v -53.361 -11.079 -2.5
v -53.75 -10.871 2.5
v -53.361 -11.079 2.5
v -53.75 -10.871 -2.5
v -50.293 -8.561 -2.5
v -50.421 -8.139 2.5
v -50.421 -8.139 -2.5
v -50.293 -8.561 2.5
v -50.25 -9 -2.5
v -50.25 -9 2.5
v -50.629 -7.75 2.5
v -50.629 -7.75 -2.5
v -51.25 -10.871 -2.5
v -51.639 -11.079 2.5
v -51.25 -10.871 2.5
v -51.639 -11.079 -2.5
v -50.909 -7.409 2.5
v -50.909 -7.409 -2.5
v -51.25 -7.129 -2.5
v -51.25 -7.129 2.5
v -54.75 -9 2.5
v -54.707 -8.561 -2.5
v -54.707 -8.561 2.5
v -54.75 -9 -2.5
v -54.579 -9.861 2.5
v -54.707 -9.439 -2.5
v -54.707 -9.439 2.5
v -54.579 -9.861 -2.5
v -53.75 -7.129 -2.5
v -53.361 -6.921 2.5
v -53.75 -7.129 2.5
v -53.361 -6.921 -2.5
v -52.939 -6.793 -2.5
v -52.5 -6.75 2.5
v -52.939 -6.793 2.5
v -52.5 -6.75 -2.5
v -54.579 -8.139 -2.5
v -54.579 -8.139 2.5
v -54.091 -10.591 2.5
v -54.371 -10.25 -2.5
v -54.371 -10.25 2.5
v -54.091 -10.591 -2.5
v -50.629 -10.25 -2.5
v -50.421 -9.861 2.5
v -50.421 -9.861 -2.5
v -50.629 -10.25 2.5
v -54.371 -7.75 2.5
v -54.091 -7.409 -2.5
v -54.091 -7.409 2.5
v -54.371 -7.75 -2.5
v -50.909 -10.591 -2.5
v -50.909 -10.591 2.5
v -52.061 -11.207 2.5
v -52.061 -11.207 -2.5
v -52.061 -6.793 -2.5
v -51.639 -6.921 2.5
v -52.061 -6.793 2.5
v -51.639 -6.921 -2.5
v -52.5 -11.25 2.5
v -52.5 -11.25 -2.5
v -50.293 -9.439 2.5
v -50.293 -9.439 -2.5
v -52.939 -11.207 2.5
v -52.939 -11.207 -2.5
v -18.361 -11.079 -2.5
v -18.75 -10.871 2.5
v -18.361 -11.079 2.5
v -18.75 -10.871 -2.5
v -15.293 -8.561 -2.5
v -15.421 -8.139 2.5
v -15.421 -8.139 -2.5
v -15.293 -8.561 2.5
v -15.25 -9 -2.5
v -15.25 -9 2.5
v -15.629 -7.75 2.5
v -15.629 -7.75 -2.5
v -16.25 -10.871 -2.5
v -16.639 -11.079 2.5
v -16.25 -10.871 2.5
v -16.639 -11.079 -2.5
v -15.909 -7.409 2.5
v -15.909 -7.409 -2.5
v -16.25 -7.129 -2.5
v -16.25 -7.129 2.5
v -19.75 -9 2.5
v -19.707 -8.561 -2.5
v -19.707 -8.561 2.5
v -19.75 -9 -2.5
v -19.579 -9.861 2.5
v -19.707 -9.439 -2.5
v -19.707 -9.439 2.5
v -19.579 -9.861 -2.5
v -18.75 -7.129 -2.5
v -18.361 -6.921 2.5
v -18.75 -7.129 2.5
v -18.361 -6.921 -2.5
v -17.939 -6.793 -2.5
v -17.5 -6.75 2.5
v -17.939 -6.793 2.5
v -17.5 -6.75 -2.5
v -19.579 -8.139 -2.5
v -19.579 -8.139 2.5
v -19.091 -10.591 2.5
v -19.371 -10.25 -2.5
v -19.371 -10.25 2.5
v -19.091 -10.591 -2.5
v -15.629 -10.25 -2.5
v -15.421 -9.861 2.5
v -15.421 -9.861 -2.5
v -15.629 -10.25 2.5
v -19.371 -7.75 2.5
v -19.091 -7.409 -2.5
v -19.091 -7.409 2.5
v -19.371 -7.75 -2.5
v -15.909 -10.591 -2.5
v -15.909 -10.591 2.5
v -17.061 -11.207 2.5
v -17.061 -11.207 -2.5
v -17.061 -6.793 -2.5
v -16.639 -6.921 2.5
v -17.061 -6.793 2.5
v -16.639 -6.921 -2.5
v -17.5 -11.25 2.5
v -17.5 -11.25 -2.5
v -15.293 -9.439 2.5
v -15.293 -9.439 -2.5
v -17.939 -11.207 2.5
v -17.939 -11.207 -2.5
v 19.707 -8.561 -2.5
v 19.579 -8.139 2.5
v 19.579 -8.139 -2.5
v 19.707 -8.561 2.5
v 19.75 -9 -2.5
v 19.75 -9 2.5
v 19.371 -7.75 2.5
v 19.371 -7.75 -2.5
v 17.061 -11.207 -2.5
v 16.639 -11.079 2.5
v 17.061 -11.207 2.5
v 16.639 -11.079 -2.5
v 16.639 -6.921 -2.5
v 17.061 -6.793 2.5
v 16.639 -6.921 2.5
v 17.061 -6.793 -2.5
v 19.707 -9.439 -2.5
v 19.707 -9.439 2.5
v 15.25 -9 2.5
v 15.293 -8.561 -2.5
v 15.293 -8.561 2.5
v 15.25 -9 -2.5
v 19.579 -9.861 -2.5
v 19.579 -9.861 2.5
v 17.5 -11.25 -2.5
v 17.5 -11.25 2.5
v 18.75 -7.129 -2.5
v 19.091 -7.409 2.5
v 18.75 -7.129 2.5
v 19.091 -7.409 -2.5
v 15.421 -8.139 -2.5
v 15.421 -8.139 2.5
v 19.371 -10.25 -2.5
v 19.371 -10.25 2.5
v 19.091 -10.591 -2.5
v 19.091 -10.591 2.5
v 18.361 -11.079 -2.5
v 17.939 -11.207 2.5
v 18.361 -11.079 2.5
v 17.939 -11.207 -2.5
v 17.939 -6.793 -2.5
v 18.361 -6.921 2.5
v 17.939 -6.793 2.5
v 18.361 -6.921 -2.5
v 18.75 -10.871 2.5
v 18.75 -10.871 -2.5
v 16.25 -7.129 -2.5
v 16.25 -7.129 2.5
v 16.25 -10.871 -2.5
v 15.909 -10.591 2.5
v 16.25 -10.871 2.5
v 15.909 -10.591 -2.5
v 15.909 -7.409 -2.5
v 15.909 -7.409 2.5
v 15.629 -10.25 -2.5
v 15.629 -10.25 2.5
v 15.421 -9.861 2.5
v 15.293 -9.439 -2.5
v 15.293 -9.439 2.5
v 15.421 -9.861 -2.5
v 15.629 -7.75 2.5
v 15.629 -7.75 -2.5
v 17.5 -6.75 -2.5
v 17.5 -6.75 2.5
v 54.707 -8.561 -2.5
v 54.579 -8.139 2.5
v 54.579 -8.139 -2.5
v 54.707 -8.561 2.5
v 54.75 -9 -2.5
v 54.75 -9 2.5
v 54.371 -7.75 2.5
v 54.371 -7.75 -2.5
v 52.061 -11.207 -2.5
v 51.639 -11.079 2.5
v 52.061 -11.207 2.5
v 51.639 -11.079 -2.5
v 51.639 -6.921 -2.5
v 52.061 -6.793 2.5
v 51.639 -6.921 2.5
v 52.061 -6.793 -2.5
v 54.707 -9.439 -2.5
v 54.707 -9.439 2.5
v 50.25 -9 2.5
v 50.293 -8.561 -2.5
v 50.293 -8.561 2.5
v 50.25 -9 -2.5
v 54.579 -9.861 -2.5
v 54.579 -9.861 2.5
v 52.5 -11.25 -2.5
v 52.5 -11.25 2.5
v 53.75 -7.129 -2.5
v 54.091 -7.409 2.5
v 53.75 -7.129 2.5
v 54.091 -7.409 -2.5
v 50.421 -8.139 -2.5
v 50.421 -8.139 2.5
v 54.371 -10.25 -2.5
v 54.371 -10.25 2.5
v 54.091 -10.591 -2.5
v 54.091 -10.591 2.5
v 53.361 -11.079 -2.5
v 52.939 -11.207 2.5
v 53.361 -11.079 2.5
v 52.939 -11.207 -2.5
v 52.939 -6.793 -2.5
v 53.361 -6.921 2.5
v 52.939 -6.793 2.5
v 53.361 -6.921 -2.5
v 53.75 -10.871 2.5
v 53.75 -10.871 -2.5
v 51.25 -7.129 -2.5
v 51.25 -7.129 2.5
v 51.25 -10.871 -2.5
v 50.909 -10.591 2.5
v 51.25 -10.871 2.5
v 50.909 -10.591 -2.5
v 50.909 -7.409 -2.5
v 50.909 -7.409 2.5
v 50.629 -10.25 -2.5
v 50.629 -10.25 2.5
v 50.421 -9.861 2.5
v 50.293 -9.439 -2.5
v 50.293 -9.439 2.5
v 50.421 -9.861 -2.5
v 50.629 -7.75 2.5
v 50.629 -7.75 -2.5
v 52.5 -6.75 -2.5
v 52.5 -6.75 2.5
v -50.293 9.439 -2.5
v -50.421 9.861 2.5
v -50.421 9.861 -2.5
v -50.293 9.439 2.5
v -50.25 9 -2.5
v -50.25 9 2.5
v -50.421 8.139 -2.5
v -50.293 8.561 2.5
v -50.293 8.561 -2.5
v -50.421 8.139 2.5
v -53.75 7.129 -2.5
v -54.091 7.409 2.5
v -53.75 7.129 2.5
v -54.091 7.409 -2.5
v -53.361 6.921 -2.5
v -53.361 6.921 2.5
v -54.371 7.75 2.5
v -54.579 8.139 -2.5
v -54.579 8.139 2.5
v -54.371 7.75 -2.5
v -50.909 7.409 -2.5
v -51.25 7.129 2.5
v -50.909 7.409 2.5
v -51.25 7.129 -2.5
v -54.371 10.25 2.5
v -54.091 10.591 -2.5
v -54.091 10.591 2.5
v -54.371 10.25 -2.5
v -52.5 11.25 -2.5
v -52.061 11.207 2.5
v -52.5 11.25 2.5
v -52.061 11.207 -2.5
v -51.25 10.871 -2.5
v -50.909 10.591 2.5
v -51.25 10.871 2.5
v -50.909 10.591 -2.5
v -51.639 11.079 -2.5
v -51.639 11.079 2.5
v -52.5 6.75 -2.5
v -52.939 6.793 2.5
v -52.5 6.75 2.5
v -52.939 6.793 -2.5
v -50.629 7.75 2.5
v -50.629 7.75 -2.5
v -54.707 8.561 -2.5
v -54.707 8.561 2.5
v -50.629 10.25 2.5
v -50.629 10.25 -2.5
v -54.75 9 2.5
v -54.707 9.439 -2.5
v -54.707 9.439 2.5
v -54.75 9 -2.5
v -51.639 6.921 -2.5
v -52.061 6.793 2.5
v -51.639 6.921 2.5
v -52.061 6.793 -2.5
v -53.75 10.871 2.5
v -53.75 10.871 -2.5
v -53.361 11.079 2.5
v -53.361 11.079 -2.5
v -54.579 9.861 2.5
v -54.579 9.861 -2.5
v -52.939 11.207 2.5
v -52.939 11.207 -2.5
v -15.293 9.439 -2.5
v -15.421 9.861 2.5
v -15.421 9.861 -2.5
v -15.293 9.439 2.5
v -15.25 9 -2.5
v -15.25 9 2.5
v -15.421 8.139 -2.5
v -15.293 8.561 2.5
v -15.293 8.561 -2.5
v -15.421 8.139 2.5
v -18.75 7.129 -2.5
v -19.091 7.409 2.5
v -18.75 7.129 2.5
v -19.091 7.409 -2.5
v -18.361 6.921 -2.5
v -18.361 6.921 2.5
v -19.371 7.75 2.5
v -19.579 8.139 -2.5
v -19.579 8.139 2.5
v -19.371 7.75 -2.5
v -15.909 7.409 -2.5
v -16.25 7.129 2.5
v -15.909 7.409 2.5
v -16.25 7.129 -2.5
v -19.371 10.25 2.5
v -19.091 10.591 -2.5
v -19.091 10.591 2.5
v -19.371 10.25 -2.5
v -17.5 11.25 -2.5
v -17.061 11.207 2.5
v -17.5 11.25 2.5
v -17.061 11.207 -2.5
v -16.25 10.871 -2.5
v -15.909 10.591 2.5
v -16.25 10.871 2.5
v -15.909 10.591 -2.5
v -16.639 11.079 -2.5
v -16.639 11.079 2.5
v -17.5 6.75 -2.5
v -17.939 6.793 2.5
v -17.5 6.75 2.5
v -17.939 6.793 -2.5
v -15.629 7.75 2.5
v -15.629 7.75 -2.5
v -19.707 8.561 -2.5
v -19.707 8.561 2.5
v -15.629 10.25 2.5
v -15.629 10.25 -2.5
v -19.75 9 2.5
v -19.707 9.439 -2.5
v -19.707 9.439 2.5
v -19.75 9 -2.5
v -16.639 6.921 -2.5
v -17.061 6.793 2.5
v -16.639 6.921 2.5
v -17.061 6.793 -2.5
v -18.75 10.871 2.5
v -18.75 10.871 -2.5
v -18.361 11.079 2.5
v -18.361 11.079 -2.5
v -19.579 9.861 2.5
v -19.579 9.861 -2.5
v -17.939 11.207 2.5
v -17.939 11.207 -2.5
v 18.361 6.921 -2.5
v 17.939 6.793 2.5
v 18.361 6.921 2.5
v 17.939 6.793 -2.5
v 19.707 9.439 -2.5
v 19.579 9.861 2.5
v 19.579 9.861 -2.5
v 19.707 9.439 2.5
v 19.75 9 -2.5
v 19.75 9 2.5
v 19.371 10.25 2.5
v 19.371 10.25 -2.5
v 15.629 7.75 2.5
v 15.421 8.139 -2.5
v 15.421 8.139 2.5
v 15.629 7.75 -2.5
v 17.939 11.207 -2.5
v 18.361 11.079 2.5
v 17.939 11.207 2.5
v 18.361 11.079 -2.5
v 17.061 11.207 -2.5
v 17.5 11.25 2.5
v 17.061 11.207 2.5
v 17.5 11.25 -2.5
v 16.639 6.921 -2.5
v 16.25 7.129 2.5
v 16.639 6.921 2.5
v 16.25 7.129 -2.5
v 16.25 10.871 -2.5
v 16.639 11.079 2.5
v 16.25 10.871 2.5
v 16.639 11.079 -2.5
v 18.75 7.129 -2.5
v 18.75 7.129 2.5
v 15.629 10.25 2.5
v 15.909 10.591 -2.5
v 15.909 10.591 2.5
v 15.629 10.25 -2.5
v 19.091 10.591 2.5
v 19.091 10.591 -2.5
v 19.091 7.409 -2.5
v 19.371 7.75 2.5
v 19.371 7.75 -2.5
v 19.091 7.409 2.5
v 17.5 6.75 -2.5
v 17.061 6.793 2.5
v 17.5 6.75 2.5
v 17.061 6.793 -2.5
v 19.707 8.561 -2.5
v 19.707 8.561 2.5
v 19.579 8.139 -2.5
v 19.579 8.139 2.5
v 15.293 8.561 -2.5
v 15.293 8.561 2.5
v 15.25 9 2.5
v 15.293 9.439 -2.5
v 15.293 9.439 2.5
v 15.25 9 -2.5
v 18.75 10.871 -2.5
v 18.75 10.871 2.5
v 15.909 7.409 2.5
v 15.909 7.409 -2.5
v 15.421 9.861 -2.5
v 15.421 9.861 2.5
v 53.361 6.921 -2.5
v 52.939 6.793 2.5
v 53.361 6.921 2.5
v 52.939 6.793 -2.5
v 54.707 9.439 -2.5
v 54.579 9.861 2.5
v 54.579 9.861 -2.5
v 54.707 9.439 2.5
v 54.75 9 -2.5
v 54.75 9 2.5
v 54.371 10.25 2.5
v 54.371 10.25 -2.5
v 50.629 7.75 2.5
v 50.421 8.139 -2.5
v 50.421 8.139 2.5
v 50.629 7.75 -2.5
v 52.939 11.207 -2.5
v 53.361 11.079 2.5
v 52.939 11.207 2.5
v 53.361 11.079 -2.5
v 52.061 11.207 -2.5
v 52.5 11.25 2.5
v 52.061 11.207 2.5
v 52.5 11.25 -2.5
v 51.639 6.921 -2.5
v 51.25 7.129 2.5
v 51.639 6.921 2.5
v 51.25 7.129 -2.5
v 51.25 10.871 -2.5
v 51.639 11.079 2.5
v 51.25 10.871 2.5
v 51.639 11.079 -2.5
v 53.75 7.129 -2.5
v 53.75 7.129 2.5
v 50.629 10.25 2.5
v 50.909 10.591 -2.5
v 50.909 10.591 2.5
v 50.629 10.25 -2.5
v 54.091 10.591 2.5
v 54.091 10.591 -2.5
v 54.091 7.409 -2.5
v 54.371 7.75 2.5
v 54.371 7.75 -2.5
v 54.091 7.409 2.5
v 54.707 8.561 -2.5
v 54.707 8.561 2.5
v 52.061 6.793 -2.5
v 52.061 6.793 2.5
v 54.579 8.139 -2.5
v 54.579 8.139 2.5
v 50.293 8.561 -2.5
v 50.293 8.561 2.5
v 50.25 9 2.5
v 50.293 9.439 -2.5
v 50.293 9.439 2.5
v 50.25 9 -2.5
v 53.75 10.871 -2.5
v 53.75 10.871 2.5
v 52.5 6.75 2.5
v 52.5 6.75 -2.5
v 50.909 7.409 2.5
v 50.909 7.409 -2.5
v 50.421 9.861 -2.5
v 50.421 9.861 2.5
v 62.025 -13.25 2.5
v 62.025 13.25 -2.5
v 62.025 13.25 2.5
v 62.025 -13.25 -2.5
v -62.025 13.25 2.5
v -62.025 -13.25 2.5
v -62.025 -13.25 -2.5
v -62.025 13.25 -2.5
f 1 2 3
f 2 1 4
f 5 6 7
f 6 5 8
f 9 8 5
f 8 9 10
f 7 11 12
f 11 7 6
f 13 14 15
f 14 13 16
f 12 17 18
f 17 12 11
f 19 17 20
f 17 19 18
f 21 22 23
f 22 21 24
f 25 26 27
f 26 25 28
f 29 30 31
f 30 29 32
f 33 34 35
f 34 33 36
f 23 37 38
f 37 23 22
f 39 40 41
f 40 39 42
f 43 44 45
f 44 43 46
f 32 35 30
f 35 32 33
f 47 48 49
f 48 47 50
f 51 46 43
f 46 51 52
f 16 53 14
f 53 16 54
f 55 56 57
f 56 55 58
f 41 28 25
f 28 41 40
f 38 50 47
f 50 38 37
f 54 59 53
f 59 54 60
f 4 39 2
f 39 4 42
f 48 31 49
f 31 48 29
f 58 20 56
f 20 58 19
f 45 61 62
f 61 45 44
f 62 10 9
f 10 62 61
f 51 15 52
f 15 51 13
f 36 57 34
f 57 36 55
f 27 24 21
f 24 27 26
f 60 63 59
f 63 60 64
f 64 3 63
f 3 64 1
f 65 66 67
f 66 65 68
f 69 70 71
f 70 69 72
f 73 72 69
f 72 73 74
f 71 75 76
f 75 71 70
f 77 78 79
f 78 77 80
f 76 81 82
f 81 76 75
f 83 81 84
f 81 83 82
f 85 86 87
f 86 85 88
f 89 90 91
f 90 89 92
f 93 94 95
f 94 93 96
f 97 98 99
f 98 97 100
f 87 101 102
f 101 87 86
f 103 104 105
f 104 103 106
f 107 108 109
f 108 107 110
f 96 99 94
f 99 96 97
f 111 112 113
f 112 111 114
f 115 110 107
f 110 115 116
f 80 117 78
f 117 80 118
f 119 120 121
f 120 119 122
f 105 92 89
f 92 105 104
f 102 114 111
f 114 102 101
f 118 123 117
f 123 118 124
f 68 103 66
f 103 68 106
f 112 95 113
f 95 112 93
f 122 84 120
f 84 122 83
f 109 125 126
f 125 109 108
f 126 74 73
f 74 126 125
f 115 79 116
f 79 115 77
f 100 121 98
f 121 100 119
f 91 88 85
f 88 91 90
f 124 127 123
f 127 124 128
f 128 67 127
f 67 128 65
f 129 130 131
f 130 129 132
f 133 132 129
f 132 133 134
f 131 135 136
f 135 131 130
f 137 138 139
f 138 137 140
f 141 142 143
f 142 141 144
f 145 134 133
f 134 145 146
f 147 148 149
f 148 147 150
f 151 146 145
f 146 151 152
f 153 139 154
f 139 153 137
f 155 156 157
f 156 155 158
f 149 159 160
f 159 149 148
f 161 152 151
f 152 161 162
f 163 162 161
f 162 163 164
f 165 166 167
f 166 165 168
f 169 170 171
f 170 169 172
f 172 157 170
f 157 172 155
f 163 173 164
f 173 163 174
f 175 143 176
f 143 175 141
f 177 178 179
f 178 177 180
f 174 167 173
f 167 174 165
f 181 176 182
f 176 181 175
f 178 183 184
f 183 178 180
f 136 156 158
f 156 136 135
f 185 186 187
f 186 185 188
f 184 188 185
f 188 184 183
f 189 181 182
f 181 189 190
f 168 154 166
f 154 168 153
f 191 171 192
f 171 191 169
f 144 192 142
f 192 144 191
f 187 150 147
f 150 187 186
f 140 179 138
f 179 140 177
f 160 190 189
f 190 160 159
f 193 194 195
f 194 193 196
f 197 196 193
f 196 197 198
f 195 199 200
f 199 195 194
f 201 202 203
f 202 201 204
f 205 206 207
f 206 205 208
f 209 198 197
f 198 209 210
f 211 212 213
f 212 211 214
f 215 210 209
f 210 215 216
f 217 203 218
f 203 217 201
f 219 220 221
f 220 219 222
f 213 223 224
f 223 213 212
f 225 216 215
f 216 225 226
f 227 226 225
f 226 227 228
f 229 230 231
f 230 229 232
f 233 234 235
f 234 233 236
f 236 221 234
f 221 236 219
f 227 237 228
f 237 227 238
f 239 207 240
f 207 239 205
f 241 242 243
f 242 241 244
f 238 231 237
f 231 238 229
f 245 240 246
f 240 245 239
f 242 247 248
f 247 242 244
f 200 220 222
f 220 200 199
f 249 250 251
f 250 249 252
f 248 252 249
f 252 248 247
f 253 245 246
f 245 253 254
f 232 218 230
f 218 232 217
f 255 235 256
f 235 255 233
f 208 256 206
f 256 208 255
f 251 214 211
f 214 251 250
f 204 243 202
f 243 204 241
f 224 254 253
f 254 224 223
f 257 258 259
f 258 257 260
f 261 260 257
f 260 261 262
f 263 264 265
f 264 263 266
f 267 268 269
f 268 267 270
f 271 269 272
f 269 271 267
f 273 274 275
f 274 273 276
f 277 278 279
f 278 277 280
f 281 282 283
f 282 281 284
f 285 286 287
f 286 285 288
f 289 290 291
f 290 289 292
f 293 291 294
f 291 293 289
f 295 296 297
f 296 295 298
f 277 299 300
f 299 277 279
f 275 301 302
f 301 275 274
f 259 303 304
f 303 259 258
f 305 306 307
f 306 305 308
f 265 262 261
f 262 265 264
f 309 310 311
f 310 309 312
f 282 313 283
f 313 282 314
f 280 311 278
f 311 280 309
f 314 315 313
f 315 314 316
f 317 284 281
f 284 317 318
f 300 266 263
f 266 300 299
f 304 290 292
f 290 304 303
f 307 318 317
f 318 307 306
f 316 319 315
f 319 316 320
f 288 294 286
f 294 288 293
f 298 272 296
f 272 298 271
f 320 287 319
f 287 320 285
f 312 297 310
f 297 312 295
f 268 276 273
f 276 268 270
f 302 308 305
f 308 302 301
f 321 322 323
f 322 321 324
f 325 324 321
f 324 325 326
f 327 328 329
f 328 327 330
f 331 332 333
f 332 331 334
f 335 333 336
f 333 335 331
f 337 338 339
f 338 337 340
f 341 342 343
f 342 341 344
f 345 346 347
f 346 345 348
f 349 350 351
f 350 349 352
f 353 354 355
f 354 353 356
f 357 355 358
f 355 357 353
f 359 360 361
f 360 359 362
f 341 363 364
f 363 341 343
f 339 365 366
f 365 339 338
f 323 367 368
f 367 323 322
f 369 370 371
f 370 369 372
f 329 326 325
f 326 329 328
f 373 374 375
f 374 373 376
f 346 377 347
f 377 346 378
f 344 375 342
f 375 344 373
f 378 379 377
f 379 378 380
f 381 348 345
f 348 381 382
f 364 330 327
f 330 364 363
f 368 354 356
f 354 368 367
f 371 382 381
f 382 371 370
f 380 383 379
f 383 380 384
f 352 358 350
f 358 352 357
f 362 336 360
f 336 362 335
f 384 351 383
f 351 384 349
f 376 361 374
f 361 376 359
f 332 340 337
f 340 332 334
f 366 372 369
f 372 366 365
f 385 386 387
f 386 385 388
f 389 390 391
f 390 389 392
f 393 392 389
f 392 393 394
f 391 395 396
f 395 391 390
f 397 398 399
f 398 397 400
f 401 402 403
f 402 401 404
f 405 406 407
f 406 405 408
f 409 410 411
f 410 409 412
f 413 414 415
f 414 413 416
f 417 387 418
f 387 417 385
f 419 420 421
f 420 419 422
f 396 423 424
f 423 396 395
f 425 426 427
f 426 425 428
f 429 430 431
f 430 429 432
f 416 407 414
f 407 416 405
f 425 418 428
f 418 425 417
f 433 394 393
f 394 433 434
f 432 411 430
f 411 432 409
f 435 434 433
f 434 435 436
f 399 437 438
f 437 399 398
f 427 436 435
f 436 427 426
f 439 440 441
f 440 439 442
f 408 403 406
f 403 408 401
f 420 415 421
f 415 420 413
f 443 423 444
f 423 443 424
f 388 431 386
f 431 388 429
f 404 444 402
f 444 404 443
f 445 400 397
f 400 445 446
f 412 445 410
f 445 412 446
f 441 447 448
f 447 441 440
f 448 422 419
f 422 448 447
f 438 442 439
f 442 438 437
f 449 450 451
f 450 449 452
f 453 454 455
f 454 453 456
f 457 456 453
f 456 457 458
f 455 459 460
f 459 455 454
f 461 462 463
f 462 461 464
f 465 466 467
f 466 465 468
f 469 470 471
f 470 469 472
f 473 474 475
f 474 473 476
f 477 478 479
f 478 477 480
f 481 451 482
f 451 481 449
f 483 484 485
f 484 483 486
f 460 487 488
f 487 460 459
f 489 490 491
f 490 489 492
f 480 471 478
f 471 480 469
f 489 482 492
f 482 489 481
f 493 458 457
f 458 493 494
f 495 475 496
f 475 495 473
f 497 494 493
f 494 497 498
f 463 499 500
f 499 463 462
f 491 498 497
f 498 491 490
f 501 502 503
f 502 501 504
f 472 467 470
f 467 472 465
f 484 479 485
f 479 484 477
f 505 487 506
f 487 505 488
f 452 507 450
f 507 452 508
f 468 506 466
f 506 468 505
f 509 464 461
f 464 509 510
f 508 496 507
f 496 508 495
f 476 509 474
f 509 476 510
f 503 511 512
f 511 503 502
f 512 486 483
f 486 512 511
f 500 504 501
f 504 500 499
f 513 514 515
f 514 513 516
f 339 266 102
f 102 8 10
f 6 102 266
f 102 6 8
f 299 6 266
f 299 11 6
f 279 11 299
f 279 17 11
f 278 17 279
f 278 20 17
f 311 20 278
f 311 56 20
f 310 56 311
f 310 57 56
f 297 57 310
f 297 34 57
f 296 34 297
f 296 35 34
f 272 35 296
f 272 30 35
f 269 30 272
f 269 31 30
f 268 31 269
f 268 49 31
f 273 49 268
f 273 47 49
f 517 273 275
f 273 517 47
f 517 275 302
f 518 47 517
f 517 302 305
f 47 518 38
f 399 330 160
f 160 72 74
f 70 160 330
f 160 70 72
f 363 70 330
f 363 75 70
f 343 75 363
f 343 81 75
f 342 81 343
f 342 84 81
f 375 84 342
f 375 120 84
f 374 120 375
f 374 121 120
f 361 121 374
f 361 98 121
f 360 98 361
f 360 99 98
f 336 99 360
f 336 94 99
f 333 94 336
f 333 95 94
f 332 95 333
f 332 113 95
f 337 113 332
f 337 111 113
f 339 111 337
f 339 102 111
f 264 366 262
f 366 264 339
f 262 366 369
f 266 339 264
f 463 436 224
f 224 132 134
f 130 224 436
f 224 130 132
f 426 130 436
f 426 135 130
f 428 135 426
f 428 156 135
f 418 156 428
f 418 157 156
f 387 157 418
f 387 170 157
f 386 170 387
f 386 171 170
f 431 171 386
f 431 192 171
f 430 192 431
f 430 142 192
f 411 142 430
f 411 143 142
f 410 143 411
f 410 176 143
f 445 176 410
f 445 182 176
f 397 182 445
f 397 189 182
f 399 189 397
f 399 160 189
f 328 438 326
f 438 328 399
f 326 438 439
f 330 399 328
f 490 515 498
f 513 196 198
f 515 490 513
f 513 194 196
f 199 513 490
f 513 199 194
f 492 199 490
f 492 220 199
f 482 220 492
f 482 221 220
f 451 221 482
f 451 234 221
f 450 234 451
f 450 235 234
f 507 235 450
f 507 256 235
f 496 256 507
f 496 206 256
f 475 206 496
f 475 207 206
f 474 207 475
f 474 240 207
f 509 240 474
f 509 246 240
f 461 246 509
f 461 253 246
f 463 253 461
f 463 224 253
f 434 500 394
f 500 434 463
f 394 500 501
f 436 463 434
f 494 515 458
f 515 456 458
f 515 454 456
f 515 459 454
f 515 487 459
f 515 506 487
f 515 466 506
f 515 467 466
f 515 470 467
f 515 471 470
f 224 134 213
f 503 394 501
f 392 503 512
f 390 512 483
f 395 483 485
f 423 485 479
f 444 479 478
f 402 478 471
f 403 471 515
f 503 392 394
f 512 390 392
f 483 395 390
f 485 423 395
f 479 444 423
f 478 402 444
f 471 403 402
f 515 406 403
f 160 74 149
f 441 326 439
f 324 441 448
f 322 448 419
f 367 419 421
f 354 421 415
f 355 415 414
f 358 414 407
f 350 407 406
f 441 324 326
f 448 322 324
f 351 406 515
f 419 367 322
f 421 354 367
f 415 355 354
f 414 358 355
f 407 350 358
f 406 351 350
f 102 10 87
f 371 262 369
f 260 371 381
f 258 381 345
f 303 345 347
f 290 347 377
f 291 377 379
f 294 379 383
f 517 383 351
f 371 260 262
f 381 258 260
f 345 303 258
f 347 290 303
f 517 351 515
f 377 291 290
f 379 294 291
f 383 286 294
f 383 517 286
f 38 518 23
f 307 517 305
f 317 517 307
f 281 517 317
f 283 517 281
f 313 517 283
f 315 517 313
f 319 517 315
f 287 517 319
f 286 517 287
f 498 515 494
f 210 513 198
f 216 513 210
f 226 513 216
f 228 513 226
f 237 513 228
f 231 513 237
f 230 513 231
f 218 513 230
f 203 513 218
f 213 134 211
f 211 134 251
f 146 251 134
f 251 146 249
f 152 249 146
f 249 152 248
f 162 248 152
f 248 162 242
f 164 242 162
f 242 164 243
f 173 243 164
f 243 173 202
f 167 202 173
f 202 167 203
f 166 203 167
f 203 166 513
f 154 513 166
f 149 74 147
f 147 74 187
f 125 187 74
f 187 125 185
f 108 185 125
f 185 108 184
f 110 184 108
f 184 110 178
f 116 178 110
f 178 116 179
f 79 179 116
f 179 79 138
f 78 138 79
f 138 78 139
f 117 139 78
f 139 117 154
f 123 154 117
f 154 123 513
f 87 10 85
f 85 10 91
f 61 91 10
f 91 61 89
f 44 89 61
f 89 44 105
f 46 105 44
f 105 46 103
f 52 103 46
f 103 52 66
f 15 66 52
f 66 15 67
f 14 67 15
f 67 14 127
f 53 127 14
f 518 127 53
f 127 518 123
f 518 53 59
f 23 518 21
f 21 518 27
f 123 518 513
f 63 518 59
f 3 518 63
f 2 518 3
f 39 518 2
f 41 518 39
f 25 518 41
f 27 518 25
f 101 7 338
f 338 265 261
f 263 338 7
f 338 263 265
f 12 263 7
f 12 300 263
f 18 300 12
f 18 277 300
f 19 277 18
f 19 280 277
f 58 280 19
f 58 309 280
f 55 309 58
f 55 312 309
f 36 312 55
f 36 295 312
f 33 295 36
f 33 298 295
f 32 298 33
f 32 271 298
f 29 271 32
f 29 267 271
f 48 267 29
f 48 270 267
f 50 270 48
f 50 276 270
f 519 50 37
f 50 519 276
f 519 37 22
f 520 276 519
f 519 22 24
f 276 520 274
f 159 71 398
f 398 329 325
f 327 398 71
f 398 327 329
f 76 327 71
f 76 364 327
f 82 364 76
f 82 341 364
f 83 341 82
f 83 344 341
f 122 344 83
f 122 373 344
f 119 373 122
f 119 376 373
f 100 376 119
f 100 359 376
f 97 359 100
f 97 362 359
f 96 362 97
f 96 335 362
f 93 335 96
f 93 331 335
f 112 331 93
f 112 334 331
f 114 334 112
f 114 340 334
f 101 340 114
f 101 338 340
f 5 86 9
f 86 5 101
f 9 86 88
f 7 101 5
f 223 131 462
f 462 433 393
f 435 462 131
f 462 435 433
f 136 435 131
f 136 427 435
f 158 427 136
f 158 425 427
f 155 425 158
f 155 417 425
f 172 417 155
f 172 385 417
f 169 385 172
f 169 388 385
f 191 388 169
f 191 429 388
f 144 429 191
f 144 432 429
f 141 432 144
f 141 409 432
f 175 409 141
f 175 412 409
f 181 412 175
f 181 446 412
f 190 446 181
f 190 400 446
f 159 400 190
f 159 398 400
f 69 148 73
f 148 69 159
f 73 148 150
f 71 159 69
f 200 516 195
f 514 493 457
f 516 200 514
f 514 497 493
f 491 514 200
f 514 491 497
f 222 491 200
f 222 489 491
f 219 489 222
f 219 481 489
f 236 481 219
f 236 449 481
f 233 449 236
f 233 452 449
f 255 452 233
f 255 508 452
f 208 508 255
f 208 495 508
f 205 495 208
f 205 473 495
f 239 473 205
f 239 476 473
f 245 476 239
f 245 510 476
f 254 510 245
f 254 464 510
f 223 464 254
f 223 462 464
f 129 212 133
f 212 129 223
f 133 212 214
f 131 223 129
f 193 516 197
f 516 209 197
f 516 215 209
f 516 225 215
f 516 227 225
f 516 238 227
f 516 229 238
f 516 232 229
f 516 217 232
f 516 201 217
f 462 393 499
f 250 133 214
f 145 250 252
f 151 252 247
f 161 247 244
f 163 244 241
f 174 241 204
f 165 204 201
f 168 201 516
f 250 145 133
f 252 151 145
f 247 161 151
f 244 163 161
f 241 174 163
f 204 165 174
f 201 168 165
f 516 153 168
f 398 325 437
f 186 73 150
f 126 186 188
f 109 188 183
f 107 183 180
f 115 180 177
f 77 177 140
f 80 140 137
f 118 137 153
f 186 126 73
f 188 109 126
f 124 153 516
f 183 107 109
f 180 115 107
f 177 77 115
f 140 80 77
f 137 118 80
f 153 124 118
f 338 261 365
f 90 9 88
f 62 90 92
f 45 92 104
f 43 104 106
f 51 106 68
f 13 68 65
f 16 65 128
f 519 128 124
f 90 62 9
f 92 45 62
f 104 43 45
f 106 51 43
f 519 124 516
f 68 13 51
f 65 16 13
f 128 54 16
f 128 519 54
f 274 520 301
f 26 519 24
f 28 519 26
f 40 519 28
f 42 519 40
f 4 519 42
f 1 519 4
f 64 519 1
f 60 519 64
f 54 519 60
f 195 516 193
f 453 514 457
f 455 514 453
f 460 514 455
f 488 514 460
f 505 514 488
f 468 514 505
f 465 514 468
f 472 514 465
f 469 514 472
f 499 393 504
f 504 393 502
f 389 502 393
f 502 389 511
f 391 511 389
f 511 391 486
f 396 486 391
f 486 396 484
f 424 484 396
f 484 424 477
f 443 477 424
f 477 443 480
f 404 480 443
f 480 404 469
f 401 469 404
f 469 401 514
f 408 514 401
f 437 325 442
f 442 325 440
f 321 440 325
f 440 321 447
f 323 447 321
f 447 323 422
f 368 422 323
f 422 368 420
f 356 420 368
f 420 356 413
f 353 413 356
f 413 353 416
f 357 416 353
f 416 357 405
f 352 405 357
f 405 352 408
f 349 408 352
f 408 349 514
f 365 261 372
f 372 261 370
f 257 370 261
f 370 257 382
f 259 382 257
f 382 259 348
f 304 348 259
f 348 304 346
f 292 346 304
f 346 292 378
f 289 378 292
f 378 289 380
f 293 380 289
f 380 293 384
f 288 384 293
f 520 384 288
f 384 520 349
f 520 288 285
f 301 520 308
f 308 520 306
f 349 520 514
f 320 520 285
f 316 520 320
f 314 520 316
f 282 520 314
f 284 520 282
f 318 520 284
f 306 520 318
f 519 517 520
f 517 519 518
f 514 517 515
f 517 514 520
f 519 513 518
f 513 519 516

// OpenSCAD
$fn = 32;

// ----------------------------------------------------------------------
// Hole bar, 4 x Ø4.5
// tworows layout, 9.525 mm edge offset
// ----------------------------------------------------------------------

// --- parameters (mm) ---
bar_w = 26.5;     // bar width (Y)
bar_t = 5;        // bar thickness (Z)
holes = 4;        // holes per row
hole_d = 4.5;     // hole diameter
edge = 9.525;     // offset from the bar end to the first hole
pitch = 35;       // pitch between neighbouring holes
row_offset = 18;  // distance between the two rows

// --- derived feature positions (mm) ---
span = (holes - 1) * pitch;   // = 105   distance between the end holes
bar_l = span + 2 * edge;      // = 124.05   overall bar length
start_x = -bar_l / 2 + edge;  // = -52.5   X of the first hole
feature_centers = [
  [start_x + 0 * pitch, -row_offset / 2],
  [start_x + 1 * pitch, -row_offset / 2],
  [start_x + 2 * pitch, -row_offset / 2],
  [start_x + 3 * pitch, -row_offset / 2]
];   // hole centres of the first row
row2_centers = [
  [start_x + 0 * pitch, row_offset / 2],
  [start_x + 1 * pitch, row_offset / 2],
  [start_x + 2 * pitch, row_offset / 2],
  [start_x + 3 * pitch, row_offset / 2]
];   // hole centres of the second row

// bar with two rows of holes, both read from their own centre arrays
difference() {
  translate([-bar_l / 2, -bar_w / 2, -bar_t / 2]) cube([bar_l, bar_w, bar_t]);
  for (centre = feature_centers)
    translate([centre[0], centre[1], 0])
      cylinder(d = hole_d, h = bar_t + 2, center = true);
  for (centre = row2_centers)
    translate([centre[0], centre[1], 0])
      cylinder(d = hole_d, h = bar_t + 2, center = true);
}
